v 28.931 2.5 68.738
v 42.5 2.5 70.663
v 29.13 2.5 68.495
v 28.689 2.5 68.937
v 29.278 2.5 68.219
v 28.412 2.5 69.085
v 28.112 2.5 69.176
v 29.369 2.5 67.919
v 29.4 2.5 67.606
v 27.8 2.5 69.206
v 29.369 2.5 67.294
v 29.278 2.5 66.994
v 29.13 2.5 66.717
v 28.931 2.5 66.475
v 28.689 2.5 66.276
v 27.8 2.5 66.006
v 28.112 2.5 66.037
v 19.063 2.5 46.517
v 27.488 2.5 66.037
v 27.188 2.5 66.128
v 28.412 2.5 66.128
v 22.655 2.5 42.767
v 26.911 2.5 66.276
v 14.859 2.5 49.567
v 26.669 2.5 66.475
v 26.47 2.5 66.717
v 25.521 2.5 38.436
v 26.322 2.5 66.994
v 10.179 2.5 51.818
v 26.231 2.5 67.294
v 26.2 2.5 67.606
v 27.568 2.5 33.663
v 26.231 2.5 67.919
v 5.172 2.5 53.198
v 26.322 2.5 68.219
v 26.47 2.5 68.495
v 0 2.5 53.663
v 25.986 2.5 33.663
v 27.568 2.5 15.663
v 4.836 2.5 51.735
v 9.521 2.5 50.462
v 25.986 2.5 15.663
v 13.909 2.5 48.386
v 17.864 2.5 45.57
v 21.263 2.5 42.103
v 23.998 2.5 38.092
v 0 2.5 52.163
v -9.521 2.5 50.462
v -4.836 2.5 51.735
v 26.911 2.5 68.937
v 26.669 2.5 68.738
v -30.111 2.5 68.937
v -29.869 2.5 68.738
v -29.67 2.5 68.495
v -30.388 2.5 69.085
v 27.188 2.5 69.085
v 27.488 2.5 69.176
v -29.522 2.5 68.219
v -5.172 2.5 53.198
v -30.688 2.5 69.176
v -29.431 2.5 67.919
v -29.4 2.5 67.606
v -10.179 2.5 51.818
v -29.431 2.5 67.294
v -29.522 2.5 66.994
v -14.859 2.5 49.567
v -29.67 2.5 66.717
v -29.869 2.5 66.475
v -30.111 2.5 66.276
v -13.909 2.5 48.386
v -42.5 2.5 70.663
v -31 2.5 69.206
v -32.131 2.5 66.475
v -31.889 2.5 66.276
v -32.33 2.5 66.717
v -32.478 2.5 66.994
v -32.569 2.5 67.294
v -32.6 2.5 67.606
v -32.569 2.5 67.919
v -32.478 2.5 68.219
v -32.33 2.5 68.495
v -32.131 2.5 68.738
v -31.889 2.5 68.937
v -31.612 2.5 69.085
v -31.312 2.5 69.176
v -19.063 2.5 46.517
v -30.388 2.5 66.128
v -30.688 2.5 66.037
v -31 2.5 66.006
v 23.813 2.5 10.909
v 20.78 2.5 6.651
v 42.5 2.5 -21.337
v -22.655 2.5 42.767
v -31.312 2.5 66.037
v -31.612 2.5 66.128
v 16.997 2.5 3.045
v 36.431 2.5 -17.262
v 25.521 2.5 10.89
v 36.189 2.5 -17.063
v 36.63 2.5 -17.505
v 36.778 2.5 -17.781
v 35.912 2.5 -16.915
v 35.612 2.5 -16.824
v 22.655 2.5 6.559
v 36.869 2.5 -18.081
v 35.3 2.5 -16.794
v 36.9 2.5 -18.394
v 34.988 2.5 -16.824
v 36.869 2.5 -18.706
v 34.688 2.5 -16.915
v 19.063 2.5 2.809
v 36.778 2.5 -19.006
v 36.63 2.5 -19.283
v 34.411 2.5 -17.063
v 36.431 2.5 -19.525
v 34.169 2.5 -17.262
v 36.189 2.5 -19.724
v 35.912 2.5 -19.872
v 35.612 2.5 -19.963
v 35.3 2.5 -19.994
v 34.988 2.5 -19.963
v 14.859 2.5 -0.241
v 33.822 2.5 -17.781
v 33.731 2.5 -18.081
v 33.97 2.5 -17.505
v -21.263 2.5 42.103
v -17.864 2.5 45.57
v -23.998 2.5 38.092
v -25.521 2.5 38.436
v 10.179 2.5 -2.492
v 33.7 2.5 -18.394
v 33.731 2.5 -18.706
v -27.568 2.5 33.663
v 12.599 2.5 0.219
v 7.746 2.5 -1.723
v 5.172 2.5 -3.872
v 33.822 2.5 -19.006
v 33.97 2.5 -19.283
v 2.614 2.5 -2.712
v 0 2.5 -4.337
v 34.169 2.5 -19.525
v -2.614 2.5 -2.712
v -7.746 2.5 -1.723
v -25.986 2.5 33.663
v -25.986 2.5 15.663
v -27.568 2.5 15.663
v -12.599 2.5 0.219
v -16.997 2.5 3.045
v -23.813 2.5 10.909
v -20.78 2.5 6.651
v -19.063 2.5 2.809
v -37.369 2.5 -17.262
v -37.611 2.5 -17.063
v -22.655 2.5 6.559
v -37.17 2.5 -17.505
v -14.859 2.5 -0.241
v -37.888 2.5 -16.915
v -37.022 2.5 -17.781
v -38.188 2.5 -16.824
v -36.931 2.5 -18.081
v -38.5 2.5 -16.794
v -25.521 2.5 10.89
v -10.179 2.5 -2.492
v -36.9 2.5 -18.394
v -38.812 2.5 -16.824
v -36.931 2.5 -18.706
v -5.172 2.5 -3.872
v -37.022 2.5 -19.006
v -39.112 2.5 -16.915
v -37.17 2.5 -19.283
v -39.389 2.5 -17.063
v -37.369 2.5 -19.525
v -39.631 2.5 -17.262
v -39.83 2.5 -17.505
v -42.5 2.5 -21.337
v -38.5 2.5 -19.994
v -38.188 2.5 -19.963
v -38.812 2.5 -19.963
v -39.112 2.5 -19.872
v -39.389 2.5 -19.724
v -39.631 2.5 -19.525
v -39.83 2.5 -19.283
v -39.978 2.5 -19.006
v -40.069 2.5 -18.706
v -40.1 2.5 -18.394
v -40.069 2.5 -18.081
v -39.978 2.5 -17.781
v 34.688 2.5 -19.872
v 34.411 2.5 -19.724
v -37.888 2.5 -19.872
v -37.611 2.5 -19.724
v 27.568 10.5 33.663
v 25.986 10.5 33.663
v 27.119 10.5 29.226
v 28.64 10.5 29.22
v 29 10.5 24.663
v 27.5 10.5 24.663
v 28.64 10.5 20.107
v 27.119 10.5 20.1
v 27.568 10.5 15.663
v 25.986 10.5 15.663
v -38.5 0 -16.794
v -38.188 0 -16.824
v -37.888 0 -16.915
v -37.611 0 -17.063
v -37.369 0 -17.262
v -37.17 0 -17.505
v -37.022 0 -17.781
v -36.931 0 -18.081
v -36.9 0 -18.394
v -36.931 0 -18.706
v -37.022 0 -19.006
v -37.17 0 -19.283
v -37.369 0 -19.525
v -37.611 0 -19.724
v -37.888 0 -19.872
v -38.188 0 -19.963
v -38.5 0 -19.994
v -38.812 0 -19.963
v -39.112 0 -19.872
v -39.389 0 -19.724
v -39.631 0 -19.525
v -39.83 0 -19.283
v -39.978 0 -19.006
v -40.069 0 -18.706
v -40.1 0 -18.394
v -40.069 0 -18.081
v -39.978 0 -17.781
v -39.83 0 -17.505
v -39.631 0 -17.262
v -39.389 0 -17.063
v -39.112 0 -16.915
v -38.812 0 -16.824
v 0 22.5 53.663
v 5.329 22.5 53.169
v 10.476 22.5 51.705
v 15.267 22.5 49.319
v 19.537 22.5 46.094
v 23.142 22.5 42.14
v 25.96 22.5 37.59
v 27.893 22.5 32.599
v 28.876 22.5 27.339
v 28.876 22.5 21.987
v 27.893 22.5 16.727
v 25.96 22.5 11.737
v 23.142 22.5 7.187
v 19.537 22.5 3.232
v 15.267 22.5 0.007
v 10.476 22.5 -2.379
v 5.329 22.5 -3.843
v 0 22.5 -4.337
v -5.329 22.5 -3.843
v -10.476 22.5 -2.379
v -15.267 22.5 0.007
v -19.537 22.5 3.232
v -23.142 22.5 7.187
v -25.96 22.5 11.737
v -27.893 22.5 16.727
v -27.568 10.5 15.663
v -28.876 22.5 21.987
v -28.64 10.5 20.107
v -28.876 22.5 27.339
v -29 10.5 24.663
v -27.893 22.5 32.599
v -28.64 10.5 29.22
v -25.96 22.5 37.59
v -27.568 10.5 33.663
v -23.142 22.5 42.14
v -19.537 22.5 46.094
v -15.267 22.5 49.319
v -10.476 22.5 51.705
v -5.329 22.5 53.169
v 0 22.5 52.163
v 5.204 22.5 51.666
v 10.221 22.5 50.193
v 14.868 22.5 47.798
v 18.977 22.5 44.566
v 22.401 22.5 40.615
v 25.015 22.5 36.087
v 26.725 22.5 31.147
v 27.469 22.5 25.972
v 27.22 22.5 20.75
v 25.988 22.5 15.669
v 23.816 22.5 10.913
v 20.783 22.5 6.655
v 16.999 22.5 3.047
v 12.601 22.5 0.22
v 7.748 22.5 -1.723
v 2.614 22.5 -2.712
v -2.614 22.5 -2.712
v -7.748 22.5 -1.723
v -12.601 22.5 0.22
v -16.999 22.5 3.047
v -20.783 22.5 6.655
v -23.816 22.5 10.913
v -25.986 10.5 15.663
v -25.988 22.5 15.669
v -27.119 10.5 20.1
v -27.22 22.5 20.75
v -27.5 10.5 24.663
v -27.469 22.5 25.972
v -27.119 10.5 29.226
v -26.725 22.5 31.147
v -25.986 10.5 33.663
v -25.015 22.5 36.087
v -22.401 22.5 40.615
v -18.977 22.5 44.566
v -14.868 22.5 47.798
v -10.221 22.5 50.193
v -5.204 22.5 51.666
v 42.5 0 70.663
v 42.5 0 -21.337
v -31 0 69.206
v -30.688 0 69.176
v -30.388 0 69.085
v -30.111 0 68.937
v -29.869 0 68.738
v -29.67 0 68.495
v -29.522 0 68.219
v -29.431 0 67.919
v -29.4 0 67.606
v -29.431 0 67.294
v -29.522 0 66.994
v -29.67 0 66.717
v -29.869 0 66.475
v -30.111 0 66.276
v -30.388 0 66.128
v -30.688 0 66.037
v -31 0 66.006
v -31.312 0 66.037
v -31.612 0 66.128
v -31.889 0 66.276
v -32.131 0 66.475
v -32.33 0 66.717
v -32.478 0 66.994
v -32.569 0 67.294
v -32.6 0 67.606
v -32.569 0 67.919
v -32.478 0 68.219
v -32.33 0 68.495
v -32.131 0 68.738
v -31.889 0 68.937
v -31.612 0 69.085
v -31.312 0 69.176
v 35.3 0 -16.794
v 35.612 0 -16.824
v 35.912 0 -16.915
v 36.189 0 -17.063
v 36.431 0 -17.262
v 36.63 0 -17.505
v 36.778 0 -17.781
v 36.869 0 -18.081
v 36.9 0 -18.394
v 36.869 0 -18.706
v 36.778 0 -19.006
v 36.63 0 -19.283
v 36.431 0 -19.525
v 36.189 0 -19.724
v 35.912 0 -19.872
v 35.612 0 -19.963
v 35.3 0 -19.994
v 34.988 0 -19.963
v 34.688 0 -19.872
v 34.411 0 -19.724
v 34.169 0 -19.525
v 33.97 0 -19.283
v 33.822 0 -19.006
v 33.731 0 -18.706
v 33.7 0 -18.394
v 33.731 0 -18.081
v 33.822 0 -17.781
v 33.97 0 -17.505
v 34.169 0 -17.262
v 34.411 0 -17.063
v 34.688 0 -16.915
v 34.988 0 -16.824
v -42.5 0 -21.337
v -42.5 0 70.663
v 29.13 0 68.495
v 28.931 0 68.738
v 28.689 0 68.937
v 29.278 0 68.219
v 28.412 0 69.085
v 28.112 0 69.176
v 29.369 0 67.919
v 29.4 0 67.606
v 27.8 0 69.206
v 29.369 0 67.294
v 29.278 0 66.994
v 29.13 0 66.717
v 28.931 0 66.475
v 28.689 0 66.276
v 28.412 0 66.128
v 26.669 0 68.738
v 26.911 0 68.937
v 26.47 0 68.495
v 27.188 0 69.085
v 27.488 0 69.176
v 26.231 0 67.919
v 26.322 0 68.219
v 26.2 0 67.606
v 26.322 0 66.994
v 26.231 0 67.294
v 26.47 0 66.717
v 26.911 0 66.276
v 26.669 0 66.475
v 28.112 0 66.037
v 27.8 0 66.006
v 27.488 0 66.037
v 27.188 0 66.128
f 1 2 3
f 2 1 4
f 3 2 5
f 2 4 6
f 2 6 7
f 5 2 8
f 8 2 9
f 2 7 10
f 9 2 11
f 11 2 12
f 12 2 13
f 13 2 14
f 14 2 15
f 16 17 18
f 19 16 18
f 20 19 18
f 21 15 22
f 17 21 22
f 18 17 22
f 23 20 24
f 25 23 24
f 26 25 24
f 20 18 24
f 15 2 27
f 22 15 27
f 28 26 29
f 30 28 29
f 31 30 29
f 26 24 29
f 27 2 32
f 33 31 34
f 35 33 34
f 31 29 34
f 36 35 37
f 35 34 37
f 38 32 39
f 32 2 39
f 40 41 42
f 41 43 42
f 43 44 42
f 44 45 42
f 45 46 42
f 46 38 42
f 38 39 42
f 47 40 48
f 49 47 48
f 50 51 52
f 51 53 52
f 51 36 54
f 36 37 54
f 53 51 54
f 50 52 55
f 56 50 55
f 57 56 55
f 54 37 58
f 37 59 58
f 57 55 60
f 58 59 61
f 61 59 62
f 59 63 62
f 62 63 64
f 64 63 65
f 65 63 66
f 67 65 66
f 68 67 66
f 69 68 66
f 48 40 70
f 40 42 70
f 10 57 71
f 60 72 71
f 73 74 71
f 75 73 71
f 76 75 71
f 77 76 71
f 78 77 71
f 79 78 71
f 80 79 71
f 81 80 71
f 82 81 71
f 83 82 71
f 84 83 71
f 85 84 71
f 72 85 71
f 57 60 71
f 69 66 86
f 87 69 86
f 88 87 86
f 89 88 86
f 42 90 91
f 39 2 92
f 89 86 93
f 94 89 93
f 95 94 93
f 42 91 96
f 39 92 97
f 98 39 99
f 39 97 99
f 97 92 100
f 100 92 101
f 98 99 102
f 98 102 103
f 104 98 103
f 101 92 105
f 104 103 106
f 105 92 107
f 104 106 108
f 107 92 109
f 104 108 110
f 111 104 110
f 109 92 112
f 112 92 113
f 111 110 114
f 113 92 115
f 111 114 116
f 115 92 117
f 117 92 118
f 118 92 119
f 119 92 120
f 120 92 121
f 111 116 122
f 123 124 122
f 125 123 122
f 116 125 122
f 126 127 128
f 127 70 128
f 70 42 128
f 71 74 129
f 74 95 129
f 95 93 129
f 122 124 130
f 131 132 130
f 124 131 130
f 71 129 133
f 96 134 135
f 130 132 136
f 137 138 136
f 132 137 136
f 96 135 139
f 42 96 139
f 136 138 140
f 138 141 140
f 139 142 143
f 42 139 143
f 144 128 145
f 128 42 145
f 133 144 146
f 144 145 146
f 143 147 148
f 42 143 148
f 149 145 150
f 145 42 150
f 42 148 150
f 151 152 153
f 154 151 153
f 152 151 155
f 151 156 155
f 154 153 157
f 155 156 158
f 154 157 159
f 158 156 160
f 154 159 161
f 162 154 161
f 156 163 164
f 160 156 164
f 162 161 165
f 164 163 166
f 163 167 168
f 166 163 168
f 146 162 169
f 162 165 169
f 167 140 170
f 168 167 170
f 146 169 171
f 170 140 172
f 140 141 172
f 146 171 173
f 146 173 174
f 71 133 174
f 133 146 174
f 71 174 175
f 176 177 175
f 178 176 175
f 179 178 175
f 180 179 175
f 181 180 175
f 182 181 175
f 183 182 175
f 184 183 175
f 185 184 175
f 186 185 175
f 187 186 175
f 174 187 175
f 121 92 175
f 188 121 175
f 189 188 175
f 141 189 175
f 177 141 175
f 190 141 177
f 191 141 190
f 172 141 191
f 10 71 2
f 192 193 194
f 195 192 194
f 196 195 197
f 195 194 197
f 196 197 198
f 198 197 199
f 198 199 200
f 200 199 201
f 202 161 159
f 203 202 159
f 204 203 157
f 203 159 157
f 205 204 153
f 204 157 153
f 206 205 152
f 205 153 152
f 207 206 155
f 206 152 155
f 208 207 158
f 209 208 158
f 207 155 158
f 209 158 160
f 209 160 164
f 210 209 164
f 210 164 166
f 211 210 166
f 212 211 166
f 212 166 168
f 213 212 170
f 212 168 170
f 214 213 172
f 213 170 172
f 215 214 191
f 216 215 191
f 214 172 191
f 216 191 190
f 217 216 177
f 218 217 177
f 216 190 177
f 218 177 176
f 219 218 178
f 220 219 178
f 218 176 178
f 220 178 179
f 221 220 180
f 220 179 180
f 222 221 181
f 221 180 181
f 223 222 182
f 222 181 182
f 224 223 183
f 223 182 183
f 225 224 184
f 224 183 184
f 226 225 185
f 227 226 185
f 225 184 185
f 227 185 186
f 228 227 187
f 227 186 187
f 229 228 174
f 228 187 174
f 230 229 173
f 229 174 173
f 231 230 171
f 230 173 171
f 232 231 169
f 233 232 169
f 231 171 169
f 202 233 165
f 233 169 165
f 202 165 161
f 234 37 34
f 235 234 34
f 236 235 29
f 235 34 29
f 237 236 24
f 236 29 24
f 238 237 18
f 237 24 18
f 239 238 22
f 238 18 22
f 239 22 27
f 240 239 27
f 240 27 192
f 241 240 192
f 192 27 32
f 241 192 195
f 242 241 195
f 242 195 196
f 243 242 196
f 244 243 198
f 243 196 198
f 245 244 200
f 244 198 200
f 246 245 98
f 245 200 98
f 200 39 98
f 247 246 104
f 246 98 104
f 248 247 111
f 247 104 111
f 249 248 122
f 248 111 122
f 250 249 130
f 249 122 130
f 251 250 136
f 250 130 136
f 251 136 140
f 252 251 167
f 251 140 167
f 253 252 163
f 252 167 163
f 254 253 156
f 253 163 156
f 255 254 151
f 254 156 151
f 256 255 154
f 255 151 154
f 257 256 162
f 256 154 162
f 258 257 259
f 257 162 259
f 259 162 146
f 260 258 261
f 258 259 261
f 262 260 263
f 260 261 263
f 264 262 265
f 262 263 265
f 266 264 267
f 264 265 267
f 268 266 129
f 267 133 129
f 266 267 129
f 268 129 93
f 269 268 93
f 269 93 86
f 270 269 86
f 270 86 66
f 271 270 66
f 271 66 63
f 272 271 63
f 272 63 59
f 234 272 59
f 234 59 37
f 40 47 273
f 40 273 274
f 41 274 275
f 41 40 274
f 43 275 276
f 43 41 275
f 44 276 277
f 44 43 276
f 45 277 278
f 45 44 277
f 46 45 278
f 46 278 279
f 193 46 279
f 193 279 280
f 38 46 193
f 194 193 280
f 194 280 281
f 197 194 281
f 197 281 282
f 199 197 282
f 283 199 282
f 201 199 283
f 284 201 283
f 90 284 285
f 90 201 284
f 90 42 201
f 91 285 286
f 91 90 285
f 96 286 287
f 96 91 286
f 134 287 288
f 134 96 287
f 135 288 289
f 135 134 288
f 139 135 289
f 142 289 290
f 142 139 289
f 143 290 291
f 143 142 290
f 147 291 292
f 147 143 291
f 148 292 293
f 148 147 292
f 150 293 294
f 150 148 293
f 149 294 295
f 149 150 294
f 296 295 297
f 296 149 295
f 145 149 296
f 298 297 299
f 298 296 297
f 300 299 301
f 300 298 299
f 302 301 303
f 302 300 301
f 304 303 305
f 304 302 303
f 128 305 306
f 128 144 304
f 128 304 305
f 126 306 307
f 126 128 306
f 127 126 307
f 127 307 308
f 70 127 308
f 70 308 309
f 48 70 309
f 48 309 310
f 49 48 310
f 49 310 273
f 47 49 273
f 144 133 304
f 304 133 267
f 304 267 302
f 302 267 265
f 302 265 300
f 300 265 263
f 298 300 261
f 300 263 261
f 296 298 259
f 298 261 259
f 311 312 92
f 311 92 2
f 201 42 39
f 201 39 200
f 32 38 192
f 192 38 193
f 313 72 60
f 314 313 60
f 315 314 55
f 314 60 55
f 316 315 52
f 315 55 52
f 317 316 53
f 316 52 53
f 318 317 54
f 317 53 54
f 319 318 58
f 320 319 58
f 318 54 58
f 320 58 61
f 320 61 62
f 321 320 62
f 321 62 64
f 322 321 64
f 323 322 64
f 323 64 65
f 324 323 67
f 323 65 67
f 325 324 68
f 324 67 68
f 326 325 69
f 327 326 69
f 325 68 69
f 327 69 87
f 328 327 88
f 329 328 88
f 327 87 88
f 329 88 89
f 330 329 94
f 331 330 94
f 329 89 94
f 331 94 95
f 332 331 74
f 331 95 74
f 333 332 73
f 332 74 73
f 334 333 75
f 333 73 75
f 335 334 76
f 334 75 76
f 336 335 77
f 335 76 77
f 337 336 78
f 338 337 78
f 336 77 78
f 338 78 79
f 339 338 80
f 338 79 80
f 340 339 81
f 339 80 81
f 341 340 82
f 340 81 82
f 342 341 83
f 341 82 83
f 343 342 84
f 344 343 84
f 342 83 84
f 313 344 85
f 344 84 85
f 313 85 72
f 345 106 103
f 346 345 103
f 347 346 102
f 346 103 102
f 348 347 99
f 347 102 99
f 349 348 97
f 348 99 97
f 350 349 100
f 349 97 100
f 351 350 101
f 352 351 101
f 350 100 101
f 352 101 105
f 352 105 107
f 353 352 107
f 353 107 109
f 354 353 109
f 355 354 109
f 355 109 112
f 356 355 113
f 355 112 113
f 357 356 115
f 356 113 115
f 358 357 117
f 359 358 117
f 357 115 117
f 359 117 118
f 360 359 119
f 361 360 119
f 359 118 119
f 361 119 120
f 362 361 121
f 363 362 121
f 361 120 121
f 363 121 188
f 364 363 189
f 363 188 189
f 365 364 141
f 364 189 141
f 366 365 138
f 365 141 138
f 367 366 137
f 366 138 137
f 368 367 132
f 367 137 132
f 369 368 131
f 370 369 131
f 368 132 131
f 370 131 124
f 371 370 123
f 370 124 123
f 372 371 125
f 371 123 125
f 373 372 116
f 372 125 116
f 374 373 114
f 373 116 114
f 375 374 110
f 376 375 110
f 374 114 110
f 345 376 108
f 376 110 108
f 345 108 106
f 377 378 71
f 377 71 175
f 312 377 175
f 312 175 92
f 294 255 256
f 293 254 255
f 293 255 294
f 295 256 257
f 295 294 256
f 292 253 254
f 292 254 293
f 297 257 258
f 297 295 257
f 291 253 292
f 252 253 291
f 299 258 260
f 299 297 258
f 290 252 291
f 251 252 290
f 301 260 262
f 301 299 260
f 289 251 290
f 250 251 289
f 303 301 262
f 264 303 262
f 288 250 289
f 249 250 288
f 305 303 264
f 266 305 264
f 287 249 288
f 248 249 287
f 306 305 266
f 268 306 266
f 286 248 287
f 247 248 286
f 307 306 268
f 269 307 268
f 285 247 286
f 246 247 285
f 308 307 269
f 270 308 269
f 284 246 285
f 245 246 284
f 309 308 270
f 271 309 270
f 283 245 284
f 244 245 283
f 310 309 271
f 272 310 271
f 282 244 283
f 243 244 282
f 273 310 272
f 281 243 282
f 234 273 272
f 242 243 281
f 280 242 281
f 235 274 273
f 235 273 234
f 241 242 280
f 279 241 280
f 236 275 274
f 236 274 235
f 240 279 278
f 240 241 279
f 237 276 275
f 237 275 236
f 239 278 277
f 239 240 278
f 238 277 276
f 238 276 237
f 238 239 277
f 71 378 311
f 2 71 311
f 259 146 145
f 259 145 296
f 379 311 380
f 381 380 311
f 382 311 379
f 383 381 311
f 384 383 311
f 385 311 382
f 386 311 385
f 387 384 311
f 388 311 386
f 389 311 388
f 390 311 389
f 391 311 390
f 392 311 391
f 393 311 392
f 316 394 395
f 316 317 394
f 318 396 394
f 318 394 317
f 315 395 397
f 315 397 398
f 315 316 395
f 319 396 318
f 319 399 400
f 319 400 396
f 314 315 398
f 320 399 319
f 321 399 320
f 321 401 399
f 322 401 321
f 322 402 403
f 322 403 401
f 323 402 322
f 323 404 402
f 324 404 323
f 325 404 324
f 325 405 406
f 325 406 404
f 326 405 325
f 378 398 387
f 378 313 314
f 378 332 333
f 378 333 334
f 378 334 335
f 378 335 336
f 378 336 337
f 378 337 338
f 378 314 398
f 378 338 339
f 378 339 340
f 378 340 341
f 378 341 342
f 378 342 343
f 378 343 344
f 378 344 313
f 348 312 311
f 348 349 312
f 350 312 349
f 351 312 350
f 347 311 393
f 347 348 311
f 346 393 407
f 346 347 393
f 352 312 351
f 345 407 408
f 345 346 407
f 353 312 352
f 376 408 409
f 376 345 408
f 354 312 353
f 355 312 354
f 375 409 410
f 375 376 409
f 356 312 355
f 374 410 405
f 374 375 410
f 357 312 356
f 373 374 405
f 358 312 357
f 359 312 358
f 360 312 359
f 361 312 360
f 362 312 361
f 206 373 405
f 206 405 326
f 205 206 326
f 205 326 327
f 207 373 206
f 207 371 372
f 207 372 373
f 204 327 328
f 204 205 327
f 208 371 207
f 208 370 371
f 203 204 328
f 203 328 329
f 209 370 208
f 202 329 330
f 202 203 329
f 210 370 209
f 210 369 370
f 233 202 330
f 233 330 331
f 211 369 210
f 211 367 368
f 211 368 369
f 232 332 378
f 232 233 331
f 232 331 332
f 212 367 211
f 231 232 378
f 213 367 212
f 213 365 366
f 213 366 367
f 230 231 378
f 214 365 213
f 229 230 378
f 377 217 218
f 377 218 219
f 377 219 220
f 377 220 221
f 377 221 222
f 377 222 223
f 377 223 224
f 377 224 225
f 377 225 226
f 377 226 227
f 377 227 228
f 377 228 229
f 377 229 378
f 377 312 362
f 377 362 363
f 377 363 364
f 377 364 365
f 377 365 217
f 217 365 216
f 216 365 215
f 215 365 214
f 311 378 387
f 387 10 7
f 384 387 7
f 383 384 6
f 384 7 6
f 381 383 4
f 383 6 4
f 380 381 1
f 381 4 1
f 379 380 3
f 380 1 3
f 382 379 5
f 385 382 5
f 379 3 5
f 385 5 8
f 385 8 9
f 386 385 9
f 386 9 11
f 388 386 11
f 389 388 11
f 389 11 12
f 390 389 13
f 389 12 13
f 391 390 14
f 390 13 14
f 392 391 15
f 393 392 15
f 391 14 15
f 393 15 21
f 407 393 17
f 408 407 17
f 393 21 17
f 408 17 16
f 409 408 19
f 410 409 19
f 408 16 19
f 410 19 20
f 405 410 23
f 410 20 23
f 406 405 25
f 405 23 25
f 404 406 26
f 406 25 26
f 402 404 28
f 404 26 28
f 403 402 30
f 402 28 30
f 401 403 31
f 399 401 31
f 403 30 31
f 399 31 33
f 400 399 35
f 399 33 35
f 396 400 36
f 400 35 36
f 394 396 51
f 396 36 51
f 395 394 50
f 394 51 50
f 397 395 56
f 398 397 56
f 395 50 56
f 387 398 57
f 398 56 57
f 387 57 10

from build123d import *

# Parameters (mm, degrees)
EXTRUDE_1_DEPTH          = 2.5
SKETCH_4_R               = 1.6
CUT_EXTRUDE_1_DEPTH      = 2.5
SKETCH_6_R               = 29
SKETCH_6_R_2             = 27.5
EXTRUDE_2_DEPTH          = 20
CUT_EXTRUDE_2_DEPTH      = 86.473878076
CUT_EXTRUDE_2_DEPTH_BACK = 86.473878076
SKETCH_7_W               = 18
SKETCH_7_H               = 8


with BuildPart() as part:
    # 草图2 → 凸台-拉伸1 (new body)
    with BuildSketch(Plane(origin=(0, 0, 0), x_dir=(1, 0, 0), z_dir=(0, 1, 0))):
        Polygon((-42.5, 21.336828309), (42.5, 21.336828309), (42.5, -70.663171691), (32.5, -70.663171691), (-32.5, -70.663171691), (-42.5, -70.663171691), align=None)
    extrude(amount=EXTRUDE_1_DEPTH)

    # 草图4 → 切除-拉伸1 (cut)
    with BuildSketch(Plane(origin=(0, 2.5, 0), x_dir=(1, 0, 0), z_dir=(0, 1, 0))):
        with Locations(Location((-38.5, 18.393628901, 0), (0, 0, 270))):
            Circle(SKETCH_4_R)
        with Locations(Location((35.3, 18.393628901, 0), (0, 0, 270))):
            Circle(SKETCH_4_R)
        with Locations(Location((-31, -67.606371099, 0), (0, 0, 270))):
            Circle(SKETCH_4_R)
        with Locations(Location((27.8, -67.606371099, 0), (0, 0, 270))):
            Circle(SKETCH_4_R)
    extrude(amount=-CUT_EXTRUDE_1_DEPTH, mode=Mode.SUBTRACT)

    # 草图6 → 凸台-拉伸2 (add)
    with BuildSketch(Plane(origin=(0, 2.5, 0), x_dir=(1, 0, 0), z_dir=(0, 1, 0))):
        with Locations(Location((0, -24.663171691, 0), (0, 0, 270))):
            Circle(SKETCH_6_R)
        with Locations(Location((0, -24.663171691, 0), (0, 0, 270))):
            Circle(SKETCH_6_R_2, mode=Mode.SUBTRACT)
    extrude(amount=EXTRUDE_2_DEPTH)

    # 草图7 → 切除-拉伸2 (cut, two sides: drawn at the far end of the back side and taken through both)
    with BuildSketch(Plane(origin=(0, 0, 0), x_dir=(0, 0, -1), z_dir=(1, 0, 0)).offset(-CUT_EXTRUDE_2_DEPTH_BACK)):
        with Locations((-24.663171691, 6.5)):
            Rectangle(SKETCH_7_W, SKETCH_7_H)
    extrude(amount=CUT_EXTRUDE_2_DEPTH + CUT_EXTRUDE_2_DEPTH_BACK, mode=Mode.SUBTRACT)


solid = part.part
